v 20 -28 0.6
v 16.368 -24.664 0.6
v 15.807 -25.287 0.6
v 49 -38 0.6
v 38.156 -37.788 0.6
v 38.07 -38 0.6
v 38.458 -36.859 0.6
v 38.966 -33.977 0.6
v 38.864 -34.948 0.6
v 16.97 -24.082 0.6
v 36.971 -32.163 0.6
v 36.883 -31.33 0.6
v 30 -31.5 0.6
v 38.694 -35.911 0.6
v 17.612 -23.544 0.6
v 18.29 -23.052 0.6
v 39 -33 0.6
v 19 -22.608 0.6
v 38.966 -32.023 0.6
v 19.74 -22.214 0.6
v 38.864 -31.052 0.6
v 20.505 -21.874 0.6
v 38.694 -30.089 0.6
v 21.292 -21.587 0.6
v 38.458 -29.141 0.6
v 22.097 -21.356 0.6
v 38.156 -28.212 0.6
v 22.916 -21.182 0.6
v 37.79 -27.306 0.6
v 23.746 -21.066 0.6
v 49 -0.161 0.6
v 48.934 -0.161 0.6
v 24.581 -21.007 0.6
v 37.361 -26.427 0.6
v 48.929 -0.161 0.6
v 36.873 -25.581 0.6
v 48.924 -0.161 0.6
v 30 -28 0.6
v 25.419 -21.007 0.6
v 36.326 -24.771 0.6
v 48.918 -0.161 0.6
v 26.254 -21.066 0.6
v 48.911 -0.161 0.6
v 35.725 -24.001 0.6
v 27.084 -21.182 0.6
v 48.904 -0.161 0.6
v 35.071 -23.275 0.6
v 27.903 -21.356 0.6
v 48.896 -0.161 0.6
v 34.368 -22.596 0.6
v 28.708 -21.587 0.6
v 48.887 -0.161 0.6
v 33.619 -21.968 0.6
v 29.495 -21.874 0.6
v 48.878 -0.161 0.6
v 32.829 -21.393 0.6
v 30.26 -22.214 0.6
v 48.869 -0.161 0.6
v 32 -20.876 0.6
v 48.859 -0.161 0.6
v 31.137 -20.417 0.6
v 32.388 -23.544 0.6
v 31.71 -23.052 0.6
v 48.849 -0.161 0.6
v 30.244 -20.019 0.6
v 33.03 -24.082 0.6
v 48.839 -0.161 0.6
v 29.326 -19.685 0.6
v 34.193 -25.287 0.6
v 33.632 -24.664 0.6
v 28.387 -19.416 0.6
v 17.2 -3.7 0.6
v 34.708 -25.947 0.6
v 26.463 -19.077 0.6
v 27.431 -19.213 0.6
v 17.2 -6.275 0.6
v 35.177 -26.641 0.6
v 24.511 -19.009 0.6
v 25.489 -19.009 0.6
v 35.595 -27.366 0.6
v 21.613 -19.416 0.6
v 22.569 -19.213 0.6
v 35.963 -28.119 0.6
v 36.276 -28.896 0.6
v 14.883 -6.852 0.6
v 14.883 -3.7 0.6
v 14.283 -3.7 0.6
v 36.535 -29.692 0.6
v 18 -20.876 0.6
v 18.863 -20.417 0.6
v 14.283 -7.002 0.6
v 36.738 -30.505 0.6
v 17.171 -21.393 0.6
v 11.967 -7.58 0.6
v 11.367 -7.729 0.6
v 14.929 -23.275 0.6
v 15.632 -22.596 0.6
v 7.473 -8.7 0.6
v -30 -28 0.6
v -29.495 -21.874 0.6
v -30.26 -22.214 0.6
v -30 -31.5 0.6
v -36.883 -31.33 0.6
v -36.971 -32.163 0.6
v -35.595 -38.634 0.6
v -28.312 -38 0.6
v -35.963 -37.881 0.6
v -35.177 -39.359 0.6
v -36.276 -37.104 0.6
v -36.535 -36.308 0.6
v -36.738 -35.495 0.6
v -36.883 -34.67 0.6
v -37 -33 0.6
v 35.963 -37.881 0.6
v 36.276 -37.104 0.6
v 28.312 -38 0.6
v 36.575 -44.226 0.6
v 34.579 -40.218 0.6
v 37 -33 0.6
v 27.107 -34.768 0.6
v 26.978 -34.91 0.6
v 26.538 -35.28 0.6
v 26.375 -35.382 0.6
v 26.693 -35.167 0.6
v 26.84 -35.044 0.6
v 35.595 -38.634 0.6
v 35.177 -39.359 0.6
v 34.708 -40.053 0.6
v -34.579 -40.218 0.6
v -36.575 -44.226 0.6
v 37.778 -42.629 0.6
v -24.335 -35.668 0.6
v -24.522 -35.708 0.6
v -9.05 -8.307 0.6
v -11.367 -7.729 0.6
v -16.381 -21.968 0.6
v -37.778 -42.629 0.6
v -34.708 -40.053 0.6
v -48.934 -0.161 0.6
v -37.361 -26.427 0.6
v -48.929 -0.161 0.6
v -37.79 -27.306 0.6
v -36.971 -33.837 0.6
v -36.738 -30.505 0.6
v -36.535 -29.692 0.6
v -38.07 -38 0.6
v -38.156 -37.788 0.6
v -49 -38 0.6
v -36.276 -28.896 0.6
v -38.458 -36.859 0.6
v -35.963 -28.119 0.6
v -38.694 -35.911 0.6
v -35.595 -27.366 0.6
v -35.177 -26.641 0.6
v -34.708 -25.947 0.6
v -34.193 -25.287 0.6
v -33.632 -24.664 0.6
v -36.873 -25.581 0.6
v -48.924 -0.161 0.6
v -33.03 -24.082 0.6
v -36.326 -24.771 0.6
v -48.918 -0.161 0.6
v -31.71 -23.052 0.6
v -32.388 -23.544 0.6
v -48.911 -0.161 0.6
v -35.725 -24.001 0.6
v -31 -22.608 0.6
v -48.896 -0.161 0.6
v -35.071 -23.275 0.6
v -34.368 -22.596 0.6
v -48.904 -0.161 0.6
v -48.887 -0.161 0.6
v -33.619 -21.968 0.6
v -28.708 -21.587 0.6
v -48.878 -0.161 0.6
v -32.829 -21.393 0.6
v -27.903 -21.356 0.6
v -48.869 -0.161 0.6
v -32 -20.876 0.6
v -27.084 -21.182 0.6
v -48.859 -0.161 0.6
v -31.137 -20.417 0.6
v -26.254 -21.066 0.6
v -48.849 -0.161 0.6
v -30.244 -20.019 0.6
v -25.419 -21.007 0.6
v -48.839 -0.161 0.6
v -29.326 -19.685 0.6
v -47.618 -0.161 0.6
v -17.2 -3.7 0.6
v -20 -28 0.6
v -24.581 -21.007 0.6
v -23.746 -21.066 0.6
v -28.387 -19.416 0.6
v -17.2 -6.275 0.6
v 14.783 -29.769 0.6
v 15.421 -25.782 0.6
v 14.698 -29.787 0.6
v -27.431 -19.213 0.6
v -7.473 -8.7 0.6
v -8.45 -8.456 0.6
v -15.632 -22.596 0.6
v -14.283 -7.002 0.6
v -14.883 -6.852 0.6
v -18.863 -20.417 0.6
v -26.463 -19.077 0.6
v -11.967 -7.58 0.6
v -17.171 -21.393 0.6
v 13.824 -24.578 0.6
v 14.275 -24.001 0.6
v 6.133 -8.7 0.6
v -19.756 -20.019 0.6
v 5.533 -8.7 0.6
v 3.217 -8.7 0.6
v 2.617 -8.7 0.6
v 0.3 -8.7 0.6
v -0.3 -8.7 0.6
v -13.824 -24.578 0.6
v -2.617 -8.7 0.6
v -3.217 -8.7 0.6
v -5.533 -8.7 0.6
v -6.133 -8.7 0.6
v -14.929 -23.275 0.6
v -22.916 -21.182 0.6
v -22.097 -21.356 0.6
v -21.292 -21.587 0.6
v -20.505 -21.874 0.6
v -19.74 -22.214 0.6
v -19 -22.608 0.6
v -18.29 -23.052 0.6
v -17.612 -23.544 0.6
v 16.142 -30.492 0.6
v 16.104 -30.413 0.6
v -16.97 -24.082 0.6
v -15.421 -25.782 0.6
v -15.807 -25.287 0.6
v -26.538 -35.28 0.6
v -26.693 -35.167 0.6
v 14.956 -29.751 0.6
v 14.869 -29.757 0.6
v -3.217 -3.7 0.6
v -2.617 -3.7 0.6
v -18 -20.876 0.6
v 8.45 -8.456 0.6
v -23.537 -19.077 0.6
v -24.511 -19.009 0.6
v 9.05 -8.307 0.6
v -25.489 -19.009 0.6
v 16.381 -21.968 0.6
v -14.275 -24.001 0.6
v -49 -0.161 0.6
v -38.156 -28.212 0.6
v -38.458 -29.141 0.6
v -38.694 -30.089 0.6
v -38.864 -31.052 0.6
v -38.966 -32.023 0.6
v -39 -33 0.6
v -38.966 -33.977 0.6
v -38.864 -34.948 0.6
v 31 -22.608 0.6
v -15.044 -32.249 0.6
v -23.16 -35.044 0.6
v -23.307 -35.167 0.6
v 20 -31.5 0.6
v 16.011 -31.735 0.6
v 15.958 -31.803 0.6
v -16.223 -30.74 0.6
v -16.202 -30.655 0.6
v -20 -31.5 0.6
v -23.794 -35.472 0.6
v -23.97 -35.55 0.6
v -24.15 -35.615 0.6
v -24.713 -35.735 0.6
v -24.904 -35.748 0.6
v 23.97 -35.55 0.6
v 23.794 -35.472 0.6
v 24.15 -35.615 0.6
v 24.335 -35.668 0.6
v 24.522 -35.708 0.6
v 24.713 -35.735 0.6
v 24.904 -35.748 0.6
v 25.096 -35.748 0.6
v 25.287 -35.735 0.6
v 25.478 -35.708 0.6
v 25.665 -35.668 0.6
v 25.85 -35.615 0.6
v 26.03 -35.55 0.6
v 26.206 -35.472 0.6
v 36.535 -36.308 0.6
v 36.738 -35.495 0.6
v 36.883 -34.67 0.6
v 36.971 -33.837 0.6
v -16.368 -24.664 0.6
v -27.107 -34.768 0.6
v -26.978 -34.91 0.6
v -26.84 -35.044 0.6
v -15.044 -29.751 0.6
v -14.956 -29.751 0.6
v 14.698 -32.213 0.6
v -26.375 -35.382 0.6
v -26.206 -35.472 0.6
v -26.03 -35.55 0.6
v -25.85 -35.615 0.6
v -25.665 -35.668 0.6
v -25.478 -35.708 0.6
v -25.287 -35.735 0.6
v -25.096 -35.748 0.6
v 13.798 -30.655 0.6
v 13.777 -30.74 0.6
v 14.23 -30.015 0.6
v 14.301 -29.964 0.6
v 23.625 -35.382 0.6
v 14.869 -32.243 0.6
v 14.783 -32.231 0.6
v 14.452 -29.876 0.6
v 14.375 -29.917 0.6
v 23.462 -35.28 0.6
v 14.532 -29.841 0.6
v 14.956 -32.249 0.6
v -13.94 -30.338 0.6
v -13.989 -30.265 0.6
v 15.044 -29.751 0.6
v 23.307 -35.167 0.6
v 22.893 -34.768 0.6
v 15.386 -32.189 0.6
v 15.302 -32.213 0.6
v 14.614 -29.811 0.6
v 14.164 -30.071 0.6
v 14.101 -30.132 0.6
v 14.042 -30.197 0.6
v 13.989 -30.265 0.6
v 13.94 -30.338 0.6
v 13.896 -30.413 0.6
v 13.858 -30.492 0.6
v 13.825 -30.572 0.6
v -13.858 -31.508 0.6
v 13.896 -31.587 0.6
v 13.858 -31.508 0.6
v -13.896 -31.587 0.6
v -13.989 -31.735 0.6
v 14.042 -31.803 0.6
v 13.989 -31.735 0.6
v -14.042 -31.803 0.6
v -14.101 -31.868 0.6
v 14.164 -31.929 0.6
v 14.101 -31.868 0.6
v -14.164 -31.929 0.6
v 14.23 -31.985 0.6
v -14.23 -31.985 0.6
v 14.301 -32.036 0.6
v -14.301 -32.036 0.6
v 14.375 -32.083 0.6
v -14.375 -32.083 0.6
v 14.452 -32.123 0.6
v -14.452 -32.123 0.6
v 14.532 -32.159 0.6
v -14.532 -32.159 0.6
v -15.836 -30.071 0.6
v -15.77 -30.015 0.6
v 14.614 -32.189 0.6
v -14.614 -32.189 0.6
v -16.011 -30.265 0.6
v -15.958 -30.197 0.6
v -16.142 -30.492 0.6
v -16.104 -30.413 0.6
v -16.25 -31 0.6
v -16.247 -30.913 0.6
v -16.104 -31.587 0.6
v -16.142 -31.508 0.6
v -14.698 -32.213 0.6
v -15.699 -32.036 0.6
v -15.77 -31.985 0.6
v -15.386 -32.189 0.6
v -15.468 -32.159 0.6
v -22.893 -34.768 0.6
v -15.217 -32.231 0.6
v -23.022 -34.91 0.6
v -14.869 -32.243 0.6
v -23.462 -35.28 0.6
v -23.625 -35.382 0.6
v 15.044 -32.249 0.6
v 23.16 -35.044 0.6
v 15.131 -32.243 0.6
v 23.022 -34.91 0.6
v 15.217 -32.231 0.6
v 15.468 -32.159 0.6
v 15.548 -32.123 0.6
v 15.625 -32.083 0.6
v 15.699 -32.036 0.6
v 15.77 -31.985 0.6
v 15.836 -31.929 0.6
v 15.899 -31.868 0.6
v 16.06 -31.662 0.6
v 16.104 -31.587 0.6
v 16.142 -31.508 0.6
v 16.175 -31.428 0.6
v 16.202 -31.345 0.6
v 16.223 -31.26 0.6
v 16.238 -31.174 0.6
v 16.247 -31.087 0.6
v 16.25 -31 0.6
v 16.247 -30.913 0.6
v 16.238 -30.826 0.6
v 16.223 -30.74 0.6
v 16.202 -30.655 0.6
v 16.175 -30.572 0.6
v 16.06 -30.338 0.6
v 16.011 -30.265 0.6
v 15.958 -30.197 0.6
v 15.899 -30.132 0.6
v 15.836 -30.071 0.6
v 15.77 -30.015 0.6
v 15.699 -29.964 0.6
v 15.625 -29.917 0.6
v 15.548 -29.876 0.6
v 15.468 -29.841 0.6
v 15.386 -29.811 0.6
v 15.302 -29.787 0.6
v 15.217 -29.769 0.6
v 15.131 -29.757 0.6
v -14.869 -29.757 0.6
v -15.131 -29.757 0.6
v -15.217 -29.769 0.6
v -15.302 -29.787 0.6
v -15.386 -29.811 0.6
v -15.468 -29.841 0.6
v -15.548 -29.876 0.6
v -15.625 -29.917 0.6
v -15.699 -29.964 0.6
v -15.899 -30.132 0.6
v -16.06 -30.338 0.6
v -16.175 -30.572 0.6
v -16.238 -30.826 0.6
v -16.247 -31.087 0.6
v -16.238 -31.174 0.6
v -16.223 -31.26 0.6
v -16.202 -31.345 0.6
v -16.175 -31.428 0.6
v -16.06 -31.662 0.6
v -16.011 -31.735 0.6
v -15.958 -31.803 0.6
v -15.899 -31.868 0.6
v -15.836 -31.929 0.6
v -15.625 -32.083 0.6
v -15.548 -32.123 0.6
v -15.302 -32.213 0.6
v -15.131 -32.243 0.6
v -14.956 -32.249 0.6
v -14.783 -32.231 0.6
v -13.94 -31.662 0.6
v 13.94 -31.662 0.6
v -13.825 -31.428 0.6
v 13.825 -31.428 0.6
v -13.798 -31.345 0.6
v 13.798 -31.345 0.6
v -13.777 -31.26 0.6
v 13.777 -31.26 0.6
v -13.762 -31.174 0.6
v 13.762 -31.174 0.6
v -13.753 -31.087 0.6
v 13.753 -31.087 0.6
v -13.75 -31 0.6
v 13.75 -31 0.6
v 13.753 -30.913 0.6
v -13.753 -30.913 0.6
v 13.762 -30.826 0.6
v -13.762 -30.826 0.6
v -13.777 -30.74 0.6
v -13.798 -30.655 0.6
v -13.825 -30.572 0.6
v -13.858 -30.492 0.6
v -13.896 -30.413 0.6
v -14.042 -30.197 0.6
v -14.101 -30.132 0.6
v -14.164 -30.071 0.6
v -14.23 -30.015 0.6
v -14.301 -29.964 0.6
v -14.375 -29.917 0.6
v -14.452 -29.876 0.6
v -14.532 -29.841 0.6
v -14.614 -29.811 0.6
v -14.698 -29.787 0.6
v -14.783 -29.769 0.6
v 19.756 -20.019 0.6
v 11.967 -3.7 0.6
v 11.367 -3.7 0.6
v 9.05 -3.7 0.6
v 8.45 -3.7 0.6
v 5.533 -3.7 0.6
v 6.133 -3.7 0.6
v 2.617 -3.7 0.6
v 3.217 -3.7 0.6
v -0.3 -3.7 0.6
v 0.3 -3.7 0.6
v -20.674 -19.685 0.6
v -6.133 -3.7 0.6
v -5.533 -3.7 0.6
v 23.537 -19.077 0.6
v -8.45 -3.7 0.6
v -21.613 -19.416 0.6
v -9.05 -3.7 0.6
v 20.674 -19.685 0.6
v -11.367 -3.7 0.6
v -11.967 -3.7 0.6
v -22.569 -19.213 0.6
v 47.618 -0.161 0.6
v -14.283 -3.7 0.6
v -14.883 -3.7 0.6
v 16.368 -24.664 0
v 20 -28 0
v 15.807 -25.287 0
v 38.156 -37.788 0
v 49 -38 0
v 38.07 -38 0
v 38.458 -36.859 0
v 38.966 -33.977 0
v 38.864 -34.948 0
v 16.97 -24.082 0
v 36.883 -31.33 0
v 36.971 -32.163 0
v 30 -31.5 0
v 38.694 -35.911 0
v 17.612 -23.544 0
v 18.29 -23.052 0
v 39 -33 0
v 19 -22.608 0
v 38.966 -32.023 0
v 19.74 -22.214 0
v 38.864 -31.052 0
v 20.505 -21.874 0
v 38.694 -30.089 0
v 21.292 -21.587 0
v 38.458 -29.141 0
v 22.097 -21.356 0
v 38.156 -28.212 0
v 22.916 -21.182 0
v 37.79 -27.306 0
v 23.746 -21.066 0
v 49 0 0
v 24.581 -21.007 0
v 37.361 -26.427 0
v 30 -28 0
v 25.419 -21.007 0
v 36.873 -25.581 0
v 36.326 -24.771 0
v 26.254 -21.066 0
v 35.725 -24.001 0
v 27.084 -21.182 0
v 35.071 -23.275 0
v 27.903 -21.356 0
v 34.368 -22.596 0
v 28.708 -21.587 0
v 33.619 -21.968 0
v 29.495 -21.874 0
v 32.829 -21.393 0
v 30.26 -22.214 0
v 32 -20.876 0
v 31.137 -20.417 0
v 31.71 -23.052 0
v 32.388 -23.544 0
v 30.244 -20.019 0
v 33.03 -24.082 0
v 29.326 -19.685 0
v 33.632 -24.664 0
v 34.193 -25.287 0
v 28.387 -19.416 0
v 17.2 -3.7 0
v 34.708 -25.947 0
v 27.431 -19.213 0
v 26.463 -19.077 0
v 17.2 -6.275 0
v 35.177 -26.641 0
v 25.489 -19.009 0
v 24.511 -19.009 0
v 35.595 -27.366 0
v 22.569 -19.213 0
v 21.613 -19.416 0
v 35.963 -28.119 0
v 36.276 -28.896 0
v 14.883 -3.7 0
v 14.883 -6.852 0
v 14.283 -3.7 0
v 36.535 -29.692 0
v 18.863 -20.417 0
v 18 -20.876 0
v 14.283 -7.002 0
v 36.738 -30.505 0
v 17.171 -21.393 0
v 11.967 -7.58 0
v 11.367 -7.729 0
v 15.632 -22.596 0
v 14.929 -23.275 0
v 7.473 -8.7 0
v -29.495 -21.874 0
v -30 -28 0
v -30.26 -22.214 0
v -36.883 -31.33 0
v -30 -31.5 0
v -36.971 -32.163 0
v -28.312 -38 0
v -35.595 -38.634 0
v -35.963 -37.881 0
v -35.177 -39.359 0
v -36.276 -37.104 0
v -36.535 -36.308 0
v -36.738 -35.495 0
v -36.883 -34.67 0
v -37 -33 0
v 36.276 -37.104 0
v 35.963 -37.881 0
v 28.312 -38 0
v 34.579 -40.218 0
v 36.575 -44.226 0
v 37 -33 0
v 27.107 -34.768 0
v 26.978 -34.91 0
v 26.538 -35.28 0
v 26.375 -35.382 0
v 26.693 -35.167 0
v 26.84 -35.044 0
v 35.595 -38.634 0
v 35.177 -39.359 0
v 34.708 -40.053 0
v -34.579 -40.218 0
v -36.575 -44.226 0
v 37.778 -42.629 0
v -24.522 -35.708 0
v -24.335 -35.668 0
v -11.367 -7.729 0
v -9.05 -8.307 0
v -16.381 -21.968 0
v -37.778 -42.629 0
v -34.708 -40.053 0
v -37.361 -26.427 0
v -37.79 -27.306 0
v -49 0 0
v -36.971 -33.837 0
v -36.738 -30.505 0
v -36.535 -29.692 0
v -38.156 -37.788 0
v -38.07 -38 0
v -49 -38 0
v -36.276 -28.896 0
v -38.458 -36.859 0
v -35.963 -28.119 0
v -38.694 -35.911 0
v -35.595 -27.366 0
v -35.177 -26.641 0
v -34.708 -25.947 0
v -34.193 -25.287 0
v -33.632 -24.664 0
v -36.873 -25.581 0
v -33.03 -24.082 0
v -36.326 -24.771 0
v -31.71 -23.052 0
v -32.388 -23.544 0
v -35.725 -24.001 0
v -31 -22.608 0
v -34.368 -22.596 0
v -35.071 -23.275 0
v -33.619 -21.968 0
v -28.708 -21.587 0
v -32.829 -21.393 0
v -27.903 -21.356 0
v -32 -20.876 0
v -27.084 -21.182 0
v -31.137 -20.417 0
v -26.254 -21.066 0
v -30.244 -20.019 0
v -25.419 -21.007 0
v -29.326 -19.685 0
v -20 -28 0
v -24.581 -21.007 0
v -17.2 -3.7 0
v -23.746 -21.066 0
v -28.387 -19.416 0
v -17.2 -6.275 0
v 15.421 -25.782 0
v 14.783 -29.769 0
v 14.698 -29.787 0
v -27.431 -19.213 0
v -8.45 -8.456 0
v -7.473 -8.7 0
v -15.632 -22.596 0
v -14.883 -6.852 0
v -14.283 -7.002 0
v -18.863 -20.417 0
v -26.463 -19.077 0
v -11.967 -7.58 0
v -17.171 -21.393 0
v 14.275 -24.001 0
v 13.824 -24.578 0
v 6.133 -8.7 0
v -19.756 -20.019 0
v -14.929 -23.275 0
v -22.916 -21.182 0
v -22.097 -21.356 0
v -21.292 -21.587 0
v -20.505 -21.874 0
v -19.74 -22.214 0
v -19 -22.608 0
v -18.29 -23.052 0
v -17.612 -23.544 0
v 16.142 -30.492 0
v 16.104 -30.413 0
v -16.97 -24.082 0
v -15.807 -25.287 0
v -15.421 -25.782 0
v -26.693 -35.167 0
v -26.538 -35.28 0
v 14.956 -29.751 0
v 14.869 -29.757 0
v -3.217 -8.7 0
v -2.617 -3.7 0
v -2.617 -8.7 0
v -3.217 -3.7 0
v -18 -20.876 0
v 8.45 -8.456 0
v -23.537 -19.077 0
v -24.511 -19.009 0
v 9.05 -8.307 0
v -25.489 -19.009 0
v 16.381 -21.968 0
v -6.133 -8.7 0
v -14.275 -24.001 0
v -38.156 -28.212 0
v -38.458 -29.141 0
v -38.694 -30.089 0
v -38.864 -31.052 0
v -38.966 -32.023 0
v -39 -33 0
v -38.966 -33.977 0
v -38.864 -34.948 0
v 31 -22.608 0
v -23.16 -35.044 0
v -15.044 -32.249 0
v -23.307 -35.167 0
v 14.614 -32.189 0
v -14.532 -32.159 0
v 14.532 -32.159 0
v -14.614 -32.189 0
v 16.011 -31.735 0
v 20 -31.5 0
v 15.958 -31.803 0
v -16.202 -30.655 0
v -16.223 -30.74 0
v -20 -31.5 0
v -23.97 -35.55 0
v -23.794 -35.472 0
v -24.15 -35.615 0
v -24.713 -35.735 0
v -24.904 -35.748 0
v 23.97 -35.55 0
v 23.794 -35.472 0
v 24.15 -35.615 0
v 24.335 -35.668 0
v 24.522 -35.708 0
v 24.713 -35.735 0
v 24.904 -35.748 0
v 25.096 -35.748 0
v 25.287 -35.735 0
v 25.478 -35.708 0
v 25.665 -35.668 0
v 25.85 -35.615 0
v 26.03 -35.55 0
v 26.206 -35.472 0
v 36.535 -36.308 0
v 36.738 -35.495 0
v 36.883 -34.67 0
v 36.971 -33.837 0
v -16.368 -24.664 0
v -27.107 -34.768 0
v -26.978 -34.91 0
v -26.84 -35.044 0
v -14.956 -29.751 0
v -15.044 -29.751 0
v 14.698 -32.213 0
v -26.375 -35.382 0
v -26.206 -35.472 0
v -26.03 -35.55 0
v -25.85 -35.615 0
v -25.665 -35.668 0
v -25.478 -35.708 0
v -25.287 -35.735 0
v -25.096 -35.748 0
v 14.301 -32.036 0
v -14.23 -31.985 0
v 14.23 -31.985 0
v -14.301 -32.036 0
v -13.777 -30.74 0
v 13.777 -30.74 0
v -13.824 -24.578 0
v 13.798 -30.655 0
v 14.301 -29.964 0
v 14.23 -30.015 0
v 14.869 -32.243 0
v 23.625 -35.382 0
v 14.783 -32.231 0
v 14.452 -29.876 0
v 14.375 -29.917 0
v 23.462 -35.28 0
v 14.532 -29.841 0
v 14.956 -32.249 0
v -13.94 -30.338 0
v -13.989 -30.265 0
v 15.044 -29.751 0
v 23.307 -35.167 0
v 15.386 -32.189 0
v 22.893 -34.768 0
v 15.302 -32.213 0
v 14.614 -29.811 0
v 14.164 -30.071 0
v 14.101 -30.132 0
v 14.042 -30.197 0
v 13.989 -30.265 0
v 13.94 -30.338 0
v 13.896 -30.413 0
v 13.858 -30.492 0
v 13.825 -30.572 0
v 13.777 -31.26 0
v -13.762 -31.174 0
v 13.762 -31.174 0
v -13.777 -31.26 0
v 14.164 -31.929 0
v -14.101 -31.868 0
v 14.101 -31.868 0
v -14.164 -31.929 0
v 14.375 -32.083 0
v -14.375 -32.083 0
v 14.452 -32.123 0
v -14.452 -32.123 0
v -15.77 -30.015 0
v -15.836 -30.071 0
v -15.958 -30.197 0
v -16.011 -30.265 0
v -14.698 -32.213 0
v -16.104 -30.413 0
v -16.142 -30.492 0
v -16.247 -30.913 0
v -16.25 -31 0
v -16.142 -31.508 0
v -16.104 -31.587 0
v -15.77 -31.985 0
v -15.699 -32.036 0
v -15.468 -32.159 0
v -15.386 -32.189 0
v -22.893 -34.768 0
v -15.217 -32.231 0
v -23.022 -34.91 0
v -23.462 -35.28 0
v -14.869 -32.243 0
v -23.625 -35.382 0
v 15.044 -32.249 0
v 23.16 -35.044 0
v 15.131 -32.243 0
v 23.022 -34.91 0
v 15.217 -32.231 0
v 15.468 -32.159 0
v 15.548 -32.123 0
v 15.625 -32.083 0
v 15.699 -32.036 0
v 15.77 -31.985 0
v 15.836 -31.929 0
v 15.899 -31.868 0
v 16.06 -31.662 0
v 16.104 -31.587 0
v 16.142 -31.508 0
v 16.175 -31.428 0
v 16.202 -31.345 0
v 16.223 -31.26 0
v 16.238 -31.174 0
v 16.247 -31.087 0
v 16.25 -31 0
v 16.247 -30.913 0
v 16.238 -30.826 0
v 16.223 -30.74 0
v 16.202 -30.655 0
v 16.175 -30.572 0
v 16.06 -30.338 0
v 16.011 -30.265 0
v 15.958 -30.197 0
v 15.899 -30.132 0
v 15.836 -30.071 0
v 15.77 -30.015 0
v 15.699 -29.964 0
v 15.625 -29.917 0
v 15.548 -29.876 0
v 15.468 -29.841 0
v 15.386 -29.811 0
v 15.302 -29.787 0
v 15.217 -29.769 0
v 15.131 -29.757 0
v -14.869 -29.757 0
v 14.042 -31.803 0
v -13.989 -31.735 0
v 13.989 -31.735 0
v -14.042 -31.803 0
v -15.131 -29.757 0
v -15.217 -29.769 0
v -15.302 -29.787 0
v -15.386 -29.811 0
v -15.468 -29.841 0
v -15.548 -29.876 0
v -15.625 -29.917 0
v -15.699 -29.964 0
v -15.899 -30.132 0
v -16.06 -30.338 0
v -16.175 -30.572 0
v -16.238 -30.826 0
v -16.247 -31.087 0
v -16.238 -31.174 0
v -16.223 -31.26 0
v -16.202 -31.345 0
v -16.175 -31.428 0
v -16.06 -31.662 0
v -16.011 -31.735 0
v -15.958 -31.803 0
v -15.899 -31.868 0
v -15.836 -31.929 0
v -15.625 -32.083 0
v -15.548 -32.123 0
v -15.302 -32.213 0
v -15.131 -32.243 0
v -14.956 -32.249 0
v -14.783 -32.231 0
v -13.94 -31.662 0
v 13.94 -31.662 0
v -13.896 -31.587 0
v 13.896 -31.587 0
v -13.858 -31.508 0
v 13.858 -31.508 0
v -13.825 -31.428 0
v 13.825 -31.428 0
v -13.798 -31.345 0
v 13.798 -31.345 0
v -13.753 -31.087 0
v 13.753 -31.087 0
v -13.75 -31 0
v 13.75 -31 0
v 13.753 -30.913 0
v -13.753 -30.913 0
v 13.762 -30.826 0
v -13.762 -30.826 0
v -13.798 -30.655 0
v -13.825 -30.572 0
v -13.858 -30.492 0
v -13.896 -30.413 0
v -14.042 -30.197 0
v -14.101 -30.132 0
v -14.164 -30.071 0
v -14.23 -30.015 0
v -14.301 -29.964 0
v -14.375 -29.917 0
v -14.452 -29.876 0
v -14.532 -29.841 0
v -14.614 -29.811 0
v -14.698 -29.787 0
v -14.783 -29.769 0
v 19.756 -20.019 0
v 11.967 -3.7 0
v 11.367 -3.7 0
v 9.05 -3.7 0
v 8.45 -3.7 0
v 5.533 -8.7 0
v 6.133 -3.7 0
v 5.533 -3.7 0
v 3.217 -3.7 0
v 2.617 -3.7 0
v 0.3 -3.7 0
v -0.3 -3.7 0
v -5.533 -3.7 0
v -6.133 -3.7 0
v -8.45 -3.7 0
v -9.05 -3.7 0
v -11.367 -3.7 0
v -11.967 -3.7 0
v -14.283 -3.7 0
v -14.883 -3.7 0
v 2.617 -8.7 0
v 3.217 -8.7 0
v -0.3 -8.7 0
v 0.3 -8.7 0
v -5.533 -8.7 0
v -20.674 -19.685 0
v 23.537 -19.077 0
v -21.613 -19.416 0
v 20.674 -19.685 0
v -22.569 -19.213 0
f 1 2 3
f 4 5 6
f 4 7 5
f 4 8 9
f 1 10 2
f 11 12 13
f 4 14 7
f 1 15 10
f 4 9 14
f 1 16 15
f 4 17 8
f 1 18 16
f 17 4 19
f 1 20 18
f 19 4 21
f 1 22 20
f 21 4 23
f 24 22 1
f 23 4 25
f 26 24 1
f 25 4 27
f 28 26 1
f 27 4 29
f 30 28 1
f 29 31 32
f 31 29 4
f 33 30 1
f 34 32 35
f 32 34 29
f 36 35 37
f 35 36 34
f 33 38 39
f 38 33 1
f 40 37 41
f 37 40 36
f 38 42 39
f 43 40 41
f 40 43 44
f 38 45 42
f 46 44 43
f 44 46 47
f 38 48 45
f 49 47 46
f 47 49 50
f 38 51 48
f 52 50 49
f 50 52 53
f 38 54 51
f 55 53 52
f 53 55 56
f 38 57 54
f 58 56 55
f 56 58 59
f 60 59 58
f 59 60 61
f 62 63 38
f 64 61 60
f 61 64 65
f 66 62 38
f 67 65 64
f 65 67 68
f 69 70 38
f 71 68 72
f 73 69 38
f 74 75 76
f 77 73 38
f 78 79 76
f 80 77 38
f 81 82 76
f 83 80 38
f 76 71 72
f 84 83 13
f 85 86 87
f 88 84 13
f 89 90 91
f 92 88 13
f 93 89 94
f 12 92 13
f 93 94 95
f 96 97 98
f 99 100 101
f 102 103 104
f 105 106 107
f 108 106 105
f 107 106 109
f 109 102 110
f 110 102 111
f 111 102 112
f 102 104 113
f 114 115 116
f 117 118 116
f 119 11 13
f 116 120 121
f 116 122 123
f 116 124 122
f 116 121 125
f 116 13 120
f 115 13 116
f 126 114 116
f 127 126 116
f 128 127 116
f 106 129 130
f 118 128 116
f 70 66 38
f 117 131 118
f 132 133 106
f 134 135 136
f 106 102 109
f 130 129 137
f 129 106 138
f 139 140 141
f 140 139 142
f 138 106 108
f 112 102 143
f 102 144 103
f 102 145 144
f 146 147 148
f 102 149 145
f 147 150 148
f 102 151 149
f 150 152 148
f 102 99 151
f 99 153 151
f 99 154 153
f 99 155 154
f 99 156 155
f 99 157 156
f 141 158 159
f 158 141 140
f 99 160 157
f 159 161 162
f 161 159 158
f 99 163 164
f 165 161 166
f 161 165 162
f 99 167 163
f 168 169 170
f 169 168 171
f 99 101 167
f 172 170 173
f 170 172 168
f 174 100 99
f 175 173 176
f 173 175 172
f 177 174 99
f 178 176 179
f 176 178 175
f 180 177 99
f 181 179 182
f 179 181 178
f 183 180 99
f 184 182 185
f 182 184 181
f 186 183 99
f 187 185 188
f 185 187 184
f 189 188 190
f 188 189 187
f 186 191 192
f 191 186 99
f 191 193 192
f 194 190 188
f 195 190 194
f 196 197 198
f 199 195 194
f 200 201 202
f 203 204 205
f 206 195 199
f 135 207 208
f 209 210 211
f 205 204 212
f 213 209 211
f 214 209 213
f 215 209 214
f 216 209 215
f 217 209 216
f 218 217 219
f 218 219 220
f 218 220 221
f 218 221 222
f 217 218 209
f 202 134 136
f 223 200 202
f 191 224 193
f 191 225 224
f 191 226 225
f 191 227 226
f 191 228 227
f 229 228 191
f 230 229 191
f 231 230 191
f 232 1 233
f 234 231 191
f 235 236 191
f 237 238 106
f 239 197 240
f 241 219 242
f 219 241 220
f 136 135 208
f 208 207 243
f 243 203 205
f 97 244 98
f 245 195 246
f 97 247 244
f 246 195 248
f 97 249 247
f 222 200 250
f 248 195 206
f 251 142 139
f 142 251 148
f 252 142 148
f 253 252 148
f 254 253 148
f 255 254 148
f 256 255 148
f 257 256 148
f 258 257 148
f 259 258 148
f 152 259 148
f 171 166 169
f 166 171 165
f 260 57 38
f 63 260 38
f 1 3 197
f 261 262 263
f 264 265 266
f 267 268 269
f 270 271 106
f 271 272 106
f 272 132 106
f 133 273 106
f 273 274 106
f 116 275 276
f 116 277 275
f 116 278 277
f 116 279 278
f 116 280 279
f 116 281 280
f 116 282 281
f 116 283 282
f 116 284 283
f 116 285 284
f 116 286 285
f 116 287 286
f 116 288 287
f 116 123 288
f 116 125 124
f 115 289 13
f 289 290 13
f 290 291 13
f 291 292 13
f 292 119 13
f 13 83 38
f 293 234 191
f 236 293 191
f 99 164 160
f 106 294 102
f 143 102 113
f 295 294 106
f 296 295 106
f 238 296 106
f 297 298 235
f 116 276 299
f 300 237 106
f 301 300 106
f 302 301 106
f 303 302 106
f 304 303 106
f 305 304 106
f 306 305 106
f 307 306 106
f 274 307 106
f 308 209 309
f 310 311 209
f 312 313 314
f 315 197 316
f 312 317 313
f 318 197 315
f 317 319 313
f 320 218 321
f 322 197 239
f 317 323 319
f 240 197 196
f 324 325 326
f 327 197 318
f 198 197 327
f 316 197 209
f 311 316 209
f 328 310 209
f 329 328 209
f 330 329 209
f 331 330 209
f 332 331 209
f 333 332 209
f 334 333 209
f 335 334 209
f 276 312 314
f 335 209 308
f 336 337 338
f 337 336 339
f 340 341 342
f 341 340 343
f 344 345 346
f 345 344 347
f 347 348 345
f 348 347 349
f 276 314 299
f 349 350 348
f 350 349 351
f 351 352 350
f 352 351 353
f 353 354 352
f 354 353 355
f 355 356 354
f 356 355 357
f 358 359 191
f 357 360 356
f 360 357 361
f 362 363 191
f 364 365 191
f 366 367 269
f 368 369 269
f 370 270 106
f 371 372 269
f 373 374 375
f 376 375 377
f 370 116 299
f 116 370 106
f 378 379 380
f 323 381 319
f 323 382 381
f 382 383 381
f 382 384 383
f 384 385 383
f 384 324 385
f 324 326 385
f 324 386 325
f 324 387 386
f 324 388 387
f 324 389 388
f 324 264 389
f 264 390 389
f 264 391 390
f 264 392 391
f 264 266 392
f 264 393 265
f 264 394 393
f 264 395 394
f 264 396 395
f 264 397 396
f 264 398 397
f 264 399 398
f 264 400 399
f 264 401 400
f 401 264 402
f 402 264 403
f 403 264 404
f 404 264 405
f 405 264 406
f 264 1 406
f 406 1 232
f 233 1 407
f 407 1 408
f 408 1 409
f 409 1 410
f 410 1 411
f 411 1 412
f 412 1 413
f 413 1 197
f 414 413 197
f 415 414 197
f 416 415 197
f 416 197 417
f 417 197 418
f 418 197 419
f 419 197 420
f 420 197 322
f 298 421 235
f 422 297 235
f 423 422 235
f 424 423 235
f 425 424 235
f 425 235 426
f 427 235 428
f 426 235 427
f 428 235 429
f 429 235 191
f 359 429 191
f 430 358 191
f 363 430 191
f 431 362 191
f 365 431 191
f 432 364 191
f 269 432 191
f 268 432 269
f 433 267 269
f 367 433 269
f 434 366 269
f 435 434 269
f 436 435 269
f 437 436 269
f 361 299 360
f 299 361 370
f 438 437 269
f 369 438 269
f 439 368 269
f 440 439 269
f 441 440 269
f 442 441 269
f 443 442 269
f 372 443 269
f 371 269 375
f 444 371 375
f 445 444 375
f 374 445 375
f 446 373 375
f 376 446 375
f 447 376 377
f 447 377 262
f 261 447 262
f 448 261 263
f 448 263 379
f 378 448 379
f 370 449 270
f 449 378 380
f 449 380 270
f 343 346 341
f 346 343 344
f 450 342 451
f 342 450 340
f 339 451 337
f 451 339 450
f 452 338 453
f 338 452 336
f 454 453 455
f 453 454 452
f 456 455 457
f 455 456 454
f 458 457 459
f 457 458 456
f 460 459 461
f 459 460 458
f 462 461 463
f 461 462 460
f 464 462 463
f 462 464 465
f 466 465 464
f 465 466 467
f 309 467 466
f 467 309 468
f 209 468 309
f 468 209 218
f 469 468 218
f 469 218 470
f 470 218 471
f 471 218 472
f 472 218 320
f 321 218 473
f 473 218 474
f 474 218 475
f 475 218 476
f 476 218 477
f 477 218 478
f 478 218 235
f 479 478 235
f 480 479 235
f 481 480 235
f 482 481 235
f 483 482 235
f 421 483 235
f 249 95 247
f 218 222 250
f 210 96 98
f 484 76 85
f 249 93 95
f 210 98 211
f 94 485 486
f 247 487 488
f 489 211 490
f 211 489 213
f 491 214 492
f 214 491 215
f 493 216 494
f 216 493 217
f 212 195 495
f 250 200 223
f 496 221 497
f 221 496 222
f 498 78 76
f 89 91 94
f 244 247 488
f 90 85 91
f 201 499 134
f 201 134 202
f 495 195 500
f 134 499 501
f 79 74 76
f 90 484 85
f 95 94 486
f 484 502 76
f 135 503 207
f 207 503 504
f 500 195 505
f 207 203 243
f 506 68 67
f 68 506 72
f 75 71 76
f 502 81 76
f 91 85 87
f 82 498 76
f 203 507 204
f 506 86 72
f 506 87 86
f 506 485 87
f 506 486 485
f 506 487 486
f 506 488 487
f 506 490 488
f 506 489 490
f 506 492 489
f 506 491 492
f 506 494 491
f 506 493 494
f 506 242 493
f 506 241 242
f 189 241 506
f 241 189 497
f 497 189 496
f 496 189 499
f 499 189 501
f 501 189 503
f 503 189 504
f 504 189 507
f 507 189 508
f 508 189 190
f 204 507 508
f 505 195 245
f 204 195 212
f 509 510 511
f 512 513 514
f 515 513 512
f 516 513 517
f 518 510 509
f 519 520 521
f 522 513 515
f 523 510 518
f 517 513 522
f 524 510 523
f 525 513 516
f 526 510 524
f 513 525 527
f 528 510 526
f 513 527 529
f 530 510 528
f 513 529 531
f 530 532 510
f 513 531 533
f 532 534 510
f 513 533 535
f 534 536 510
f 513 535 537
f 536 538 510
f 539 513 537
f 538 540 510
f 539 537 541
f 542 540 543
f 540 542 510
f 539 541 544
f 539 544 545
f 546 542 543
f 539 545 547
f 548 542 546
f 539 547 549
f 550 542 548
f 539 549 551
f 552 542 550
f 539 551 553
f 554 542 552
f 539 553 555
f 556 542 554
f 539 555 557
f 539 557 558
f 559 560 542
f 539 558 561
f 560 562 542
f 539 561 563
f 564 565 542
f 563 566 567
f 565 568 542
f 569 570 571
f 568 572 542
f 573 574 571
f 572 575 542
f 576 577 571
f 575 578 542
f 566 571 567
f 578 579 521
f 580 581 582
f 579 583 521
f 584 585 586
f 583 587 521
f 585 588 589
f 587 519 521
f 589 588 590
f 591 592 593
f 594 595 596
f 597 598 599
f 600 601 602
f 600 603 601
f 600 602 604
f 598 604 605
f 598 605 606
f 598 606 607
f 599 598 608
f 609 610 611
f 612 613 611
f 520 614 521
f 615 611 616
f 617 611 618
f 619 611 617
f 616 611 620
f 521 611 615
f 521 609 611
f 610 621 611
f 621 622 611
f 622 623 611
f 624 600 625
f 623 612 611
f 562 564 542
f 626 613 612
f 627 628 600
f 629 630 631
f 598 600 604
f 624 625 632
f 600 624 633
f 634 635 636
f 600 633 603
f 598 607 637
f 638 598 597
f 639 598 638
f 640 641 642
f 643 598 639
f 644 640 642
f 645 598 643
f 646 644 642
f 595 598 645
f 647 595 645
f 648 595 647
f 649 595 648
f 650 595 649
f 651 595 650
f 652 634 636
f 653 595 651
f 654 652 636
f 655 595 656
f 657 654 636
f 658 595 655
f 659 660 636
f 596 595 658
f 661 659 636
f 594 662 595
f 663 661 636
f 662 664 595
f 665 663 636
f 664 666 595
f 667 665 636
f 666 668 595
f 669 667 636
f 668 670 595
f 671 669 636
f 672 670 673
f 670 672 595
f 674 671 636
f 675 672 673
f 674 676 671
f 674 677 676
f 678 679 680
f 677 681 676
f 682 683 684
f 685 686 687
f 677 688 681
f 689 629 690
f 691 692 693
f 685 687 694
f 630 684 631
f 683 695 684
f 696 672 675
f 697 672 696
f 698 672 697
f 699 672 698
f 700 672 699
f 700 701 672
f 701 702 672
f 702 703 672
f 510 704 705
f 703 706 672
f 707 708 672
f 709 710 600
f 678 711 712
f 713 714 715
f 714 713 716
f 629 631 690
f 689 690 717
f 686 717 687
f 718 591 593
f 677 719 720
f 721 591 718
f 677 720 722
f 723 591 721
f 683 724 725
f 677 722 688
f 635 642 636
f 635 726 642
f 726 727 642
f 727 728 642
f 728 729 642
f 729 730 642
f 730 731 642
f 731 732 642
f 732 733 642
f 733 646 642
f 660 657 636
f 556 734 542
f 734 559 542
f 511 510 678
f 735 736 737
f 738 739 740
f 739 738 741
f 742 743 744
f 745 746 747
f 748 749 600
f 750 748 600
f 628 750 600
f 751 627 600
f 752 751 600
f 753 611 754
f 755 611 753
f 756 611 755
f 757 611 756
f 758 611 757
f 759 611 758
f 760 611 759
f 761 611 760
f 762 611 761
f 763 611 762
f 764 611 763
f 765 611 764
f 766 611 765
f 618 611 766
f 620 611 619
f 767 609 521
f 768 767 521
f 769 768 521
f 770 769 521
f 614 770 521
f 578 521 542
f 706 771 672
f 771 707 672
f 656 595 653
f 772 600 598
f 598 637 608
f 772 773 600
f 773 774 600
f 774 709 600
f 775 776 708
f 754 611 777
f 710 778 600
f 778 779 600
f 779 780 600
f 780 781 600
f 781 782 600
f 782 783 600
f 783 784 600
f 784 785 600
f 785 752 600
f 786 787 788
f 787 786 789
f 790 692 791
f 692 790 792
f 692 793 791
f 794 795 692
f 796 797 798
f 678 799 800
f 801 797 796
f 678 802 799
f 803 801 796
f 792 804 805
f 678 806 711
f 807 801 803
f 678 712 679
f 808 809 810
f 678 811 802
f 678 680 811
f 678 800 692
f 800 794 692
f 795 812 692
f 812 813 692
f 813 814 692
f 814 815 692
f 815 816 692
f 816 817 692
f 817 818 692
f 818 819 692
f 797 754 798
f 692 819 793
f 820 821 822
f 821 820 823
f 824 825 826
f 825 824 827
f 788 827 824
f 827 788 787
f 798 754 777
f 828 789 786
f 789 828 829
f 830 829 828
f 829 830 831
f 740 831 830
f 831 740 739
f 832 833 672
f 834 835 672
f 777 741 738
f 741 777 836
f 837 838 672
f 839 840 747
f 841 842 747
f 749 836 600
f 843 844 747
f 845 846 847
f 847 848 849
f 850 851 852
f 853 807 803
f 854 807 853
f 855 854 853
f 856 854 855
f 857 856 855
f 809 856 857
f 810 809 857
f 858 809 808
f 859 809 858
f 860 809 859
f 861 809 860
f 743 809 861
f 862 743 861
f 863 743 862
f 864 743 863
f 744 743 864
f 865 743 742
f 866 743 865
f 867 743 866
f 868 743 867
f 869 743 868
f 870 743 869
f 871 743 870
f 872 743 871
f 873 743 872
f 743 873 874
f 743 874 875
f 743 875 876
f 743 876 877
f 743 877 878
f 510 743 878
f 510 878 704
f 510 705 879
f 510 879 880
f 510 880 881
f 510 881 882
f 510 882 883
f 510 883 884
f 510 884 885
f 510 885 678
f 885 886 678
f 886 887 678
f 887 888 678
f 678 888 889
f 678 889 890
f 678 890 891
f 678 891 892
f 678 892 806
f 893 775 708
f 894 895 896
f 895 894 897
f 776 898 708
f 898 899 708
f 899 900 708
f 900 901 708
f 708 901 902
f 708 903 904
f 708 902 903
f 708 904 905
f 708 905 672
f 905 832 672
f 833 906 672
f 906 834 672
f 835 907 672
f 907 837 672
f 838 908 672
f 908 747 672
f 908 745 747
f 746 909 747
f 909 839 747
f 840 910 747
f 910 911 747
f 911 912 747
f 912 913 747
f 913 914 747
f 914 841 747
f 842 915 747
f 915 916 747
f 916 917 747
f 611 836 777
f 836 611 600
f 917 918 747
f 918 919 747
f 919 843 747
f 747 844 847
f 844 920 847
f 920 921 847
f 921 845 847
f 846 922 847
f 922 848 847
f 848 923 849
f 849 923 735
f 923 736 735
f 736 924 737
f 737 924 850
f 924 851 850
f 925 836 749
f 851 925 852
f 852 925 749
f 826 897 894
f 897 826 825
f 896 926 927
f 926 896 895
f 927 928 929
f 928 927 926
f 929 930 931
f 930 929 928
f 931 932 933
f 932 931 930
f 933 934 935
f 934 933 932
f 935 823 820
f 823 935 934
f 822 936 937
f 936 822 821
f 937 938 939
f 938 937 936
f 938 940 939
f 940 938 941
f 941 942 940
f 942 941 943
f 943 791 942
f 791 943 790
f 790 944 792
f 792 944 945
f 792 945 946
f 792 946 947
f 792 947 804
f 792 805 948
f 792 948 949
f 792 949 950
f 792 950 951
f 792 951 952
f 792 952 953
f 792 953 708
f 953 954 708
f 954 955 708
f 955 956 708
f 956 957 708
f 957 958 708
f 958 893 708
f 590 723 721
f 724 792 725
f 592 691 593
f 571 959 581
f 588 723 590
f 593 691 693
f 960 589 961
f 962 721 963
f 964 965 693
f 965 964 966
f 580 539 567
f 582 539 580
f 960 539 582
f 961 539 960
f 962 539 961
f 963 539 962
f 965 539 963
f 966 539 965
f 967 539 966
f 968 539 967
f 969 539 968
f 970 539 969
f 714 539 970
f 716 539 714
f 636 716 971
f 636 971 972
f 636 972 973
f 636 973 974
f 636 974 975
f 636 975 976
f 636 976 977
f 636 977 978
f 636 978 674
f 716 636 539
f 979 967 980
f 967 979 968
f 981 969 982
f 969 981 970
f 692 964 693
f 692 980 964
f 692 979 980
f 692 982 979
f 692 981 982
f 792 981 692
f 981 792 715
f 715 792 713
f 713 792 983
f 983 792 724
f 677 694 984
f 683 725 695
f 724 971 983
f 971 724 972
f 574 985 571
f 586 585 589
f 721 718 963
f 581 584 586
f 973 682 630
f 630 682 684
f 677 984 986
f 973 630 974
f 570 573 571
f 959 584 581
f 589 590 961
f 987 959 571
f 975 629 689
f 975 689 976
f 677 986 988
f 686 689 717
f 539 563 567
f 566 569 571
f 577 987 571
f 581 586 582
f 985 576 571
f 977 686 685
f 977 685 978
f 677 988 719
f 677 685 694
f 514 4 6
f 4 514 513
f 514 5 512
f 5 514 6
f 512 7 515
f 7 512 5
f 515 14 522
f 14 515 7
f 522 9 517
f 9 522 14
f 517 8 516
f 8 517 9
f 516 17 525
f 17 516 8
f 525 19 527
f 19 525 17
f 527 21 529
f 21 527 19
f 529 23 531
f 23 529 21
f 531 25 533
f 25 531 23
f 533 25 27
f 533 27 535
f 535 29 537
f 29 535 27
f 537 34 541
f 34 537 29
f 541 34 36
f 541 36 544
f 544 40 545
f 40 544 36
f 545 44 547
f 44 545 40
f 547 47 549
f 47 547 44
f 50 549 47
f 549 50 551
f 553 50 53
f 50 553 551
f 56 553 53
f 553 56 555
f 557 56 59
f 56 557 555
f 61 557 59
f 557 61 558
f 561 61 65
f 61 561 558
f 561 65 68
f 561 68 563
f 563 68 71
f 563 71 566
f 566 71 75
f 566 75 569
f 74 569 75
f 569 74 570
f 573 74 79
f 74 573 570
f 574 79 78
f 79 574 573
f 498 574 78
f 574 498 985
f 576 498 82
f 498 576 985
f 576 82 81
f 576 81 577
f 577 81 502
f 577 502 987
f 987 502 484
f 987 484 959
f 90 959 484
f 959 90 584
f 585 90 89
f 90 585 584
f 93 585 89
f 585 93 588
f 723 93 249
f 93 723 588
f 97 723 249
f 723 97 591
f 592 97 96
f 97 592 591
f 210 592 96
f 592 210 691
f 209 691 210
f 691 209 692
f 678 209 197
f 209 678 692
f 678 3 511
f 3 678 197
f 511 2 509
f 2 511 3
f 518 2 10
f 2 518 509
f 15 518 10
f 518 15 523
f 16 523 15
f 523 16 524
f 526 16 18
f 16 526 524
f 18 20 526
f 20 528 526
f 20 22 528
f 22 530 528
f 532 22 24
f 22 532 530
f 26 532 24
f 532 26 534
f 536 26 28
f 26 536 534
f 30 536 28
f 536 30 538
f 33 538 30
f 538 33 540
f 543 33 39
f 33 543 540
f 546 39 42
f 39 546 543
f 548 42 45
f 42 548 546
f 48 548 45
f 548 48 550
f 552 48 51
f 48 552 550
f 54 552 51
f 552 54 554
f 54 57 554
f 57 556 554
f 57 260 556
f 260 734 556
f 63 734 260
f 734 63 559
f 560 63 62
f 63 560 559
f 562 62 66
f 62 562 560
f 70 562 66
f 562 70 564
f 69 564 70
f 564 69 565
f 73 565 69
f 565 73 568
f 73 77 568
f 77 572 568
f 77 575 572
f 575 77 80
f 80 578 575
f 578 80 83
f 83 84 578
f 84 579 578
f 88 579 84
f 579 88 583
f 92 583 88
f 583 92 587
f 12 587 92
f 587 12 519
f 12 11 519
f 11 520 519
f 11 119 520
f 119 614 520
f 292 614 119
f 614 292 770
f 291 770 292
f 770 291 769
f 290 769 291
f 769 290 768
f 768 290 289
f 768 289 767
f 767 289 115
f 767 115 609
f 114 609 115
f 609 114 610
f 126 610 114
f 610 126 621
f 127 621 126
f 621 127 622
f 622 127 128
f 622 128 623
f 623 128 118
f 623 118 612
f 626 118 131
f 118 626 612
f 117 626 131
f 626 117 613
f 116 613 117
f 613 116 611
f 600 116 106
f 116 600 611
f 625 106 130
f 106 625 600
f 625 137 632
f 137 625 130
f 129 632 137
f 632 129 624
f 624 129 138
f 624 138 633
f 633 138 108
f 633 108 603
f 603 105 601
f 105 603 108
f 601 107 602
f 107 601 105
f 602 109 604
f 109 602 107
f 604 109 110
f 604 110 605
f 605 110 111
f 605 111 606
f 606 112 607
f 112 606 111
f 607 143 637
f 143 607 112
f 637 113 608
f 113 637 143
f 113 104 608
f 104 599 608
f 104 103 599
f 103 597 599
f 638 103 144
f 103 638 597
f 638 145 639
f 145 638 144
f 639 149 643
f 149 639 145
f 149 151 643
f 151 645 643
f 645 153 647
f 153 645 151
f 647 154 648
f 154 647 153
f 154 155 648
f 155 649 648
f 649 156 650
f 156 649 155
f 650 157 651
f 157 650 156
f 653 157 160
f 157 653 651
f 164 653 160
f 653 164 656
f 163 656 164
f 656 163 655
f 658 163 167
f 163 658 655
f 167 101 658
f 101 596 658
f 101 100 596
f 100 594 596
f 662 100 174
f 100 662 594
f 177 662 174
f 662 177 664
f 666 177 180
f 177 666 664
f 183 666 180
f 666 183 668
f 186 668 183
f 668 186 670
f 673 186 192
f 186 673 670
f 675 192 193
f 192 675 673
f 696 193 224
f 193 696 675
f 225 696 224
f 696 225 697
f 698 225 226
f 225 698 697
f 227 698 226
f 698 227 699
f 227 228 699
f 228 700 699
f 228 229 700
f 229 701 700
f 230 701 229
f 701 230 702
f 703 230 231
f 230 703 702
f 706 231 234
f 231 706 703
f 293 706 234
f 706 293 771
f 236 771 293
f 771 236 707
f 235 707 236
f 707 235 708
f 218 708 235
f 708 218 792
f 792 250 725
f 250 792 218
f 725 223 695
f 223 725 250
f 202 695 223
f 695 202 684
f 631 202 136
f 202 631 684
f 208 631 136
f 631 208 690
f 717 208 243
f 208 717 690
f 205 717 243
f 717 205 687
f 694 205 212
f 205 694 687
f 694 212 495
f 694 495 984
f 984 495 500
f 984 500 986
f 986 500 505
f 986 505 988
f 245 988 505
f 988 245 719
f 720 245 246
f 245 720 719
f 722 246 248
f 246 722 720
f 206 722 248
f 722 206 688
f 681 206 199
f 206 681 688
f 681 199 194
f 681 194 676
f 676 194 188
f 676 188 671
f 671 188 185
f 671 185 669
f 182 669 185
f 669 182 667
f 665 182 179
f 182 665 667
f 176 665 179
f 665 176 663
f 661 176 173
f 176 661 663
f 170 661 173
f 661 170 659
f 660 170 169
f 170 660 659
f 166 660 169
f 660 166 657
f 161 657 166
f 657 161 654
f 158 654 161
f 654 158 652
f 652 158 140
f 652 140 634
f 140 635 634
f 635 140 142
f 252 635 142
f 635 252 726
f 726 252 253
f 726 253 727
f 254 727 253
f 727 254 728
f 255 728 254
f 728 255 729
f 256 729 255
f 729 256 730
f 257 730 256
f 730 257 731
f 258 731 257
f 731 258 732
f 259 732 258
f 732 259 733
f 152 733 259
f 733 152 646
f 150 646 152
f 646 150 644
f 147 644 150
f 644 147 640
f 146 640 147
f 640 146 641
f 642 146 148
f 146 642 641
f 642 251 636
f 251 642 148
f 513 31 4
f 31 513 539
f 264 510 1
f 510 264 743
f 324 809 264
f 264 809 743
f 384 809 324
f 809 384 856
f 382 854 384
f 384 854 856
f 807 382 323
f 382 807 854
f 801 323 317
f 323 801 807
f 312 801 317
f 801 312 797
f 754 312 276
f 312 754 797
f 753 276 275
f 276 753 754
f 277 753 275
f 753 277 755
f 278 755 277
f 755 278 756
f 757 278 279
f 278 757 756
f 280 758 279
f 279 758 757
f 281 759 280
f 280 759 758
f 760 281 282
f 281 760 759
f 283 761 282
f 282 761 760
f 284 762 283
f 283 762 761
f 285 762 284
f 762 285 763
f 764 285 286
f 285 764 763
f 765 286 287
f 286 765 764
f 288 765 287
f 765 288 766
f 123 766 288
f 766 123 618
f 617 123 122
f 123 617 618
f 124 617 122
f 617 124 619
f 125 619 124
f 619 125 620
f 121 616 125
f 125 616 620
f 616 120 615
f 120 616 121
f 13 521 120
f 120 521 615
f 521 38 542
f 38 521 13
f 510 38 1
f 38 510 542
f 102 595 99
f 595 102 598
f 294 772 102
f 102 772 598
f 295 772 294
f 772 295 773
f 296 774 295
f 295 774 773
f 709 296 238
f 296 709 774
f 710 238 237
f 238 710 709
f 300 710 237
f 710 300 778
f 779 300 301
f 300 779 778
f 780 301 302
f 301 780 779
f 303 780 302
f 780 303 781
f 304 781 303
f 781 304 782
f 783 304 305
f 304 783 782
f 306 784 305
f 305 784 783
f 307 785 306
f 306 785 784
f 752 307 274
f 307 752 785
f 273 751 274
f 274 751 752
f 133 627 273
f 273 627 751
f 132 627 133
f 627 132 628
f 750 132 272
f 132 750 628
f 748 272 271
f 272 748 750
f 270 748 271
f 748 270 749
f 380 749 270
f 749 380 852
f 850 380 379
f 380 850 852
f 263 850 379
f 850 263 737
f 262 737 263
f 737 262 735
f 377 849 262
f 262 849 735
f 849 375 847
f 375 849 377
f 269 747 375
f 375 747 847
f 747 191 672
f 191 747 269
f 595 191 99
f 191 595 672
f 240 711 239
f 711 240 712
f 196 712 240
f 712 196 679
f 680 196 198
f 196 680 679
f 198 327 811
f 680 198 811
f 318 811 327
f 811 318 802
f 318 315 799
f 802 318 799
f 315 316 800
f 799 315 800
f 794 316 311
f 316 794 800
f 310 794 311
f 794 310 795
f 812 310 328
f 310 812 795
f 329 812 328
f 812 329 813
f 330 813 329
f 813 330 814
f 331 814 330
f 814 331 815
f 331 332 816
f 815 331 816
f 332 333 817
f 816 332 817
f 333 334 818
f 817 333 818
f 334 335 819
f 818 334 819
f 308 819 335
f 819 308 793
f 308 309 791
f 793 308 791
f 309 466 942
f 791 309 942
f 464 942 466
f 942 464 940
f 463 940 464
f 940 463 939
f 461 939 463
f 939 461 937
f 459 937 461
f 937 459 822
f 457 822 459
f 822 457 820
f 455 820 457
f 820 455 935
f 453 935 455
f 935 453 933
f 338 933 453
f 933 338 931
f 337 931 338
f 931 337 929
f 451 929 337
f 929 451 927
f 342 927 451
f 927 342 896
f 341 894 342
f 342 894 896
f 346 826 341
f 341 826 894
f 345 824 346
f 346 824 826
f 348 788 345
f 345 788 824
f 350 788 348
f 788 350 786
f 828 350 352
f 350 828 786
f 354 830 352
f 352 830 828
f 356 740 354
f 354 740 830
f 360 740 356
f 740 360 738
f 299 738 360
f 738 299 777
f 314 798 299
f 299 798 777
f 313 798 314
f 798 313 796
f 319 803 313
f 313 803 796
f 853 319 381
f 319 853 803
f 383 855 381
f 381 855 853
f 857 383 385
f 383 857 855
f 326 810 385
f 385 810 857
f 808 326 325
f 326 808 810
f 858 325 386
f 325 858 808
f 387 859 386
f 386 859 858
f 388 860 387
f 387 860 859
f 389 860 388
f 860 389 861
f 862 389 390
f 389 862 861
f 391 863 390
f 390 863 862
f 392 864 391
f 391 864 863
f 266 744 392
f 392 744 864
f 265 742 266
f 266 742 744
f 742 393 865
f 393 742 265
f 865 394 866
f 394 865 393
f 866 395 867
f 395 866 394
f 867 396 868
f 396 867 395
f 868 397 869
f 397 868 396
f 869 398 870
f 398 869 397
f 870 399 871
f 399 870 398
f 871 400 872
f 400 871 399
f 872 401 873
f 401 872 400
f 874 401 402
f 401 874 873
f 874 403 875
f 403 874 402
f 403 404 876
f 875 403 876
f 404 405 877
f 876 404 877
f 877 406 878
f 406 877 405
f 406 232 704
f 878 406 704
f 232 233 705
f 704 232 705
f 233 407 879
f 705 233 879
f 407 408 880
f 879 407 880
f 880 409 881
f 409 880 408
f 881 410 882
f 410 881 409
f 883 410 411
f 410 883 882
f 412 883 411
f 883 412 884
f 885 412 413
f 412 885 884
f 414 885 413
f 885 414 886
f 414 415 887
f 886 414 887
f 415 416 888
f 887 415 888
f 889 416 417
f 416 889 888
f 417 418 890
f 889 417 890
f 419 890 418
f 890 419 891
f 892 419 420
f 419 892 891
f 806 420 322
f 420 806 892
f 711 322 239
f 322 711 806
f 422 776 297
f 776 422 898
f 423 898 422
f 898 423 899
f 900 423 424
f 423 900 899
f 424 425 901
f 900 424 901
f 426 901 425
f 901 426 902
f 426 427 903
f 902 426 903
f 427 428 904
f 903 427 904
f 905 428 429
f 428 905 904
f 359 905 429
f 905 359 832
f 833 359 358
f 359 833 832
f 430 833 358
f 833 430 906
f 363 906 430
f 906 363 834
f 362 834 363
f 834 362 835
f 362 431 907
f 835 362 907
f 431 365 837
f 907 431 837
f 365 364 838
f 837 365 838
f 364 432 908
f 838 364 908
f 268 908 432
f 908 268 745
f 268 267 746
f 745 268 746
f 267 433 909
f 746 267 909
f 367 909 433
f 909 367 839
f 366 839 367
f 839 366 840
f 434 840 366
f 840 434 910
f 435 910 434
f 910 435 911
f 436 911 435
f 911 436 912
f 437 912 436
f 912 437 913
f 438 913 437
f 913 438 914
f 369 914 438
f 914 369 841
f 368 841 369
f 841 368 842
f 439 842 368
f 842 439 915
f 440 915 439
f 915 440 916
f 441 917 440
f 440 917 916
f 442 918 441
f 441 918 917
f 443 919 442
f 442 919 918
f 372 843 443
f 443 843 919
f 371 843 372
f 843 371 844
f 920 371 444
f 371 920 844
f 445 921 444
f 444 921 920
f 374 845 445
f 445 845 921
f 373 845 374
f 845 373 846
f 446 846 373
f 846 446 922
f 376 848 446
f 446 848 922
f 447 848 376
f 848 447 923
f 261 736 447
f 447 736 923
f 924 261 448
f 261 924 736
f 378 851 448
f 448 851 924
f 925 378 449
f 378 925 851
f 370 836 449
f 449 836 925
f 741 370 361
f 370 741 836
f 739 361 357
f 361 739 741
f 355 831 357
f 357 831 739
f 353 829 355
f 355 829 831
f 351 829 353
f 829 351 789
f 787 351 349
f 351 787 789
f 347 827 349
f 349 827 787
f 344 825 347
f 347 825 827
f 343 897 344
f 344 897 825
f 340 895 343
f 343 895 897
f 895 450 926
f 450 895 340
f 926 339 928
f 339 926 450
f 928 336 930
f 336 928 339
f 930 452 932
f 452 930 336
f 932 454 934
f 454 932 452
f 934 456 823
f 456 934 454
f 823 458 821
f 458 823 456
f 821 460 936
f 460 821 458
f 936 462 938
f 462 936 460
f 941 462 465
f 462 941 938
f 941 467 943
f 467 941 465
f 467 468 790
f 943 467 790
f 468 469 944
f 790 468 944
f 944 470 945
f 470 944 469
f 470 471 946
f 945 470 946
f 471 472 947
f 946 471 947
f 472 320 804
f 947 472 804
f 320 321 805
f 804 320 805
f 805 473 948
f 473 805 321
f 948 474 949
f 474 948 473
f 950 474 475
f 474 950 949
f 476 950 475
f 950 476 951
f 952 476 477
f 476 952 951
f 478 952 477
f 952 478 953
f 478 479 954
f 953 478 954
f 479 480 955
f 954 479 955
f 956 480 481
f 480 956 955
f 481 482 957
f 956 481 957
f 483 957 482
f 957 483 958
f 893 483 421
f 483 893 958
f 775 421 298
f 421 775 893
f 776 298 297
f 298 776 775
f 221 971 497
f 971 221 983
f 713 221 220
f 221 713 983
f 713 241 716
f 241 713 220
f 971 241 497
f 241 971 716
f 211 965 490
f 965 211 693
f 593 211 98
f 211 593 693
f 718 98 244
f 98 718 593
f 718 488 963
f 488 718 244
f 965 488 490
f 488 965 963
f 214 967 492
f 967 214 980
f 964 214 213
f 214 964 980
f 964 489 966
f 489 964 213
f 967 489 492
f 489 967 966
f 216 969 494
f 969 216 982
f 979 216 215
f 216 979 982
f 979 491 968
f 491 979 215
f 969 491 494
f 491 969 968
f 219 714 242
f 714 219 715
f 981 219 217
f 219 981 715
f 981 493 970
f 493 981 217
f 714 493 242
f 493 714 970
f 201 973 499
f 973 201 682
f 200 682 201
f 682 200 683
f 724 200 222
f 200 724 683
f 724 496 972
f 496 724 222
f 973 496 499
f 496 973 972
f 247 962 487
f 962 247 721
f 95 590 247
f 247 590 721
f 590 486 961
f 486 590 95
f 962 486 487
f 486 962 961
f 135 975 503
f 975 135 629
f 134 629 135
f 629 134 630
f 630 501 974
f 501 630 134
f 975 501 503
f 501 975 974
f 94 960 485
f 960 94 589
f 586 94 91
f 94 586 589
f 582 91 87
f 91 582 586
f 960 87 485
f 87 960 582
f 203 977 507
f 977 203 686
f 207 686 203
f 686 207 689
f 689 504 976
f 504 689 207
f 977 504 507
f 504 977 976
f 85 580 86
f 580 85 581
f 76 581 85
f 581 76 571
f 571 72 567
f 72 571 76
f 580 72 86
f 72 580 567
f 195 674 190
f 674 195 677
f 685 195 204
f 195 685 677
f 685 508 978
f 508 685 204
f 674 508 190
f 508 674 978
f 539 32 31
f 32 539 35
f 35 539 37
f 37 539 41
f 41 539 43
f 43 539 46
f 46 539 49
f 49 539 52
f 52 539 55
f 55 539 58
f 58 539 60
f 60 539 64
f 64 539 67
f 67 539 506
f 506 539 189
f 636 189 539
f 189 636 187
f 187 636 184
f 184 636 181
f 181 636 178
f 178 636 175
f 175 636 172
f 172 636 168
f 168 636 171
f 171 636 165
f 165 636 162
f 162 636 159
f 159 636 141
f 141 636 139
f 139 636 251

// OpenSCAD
$fn=90;
face_x=98;
face_y=38;

led=5.5;
led_box=10;
led_box_h=3.5;

screw=2.5;

eye_gap=50;
eye_x=eye_gap/2;
eye_y=face_y-5;

screw_gap=30;
screw_x=screw_gap/2;
screw_y=face_y-7;

ring_center=eye_x-screw_x+3;
ring_thick=2;

ring_outer=ring_center+ring_thick/2;
ring_inner=ring_center-ring_thick/2;
ring_angle=37;

pad=0.1;
padd=pad*2;

mouth_x=35;
mouth_y=5;
mouth_offset=3.7;

teeth=12;
tooth_gap=0.6;

frown=mouth_y/2;
frown_angle=14;

face_thick=0.6;
face_angle=15;

brow_x=ring_inner+ring_thick*2;
brow_y=ring_thick;


module teeth(){
    gap=mouth_x/teeth;
    for(x=[0:gap:mouth_x]) {
        translate([-tooth_gap/2+x,-pad])
        square([tooth_gap,mouth_y+padd]);
    }
}

module half_frown() {
    translate([0,frown])
    rotate([0,0,frown_angle])
    square([mouth_x,mouth_y]);
}

module frown() {
    half_frown();
    translate([mouth_x,0])
    mirror([1,0])
    half_frown();
}

module mouth() {
    translate([-mouth_x/2,mouth_offset])
    difference() {
        square([mouth_x,mouth_y]);
        teeth();
        frown();
    }
}

module screw() {
    translate([screw_x,screw_y])
    circle(d=screw);
    translate([-screw_x,screw_y])
    circle(d=screw);
}

module screws() {
    screw();
}

module led() {
    hull() {
        circle(d=led);
        translate([-led_box/2,-led_box/2])
        square([led_box,led_box_h]);
    }
}

module ring(d=0) {
    difference() {
        circle(d);
        rotate([0,0,ring_angle])
        translate([-d-pad,0])
        square([d*2+padd,d*2+padd]);
    }
}

module eye() {
    led();
    difference() {
        ring(ring_outer);
        ring(ring_inner);
    }
}

module eyes() {
    translate([eye_x,eye_y])
    eye();
    translate([-eye_x,eye_y])
    mirror([1,0,0])
    eye();
}

module brow() {
    rotate([0,0,ring_angle])
    square([brow_x,brow_y]);
    ring(ring_inner);
}


module face_positive() {
    translate([eye_x,eye_y])
    brow();
    translate([-eye_x,eye_y])
    mirror([1,0,0])
    brow();
    translate([-face_x/2,0])
    square([face_x,face_y]);
}

module face() {
    difference() {
        face_positive();
        eyes();
        screws();
        mouth();
    }
}

module face_3d() {
    difference() {
        rotate([90-face_angle,0,0])
        translate([0,0,-face_thick])
        linear_extrude(height=face_thick)
        face();
        translate([-face_x/2-pad,0,-face_thick*2])
        cube([face_x+padd,face_thick*2,face_thick*2]);
    }
}

module face_to_print() {
    rotate([90+face_angle,0,0])
    face_3d();
}

face_to_print();
